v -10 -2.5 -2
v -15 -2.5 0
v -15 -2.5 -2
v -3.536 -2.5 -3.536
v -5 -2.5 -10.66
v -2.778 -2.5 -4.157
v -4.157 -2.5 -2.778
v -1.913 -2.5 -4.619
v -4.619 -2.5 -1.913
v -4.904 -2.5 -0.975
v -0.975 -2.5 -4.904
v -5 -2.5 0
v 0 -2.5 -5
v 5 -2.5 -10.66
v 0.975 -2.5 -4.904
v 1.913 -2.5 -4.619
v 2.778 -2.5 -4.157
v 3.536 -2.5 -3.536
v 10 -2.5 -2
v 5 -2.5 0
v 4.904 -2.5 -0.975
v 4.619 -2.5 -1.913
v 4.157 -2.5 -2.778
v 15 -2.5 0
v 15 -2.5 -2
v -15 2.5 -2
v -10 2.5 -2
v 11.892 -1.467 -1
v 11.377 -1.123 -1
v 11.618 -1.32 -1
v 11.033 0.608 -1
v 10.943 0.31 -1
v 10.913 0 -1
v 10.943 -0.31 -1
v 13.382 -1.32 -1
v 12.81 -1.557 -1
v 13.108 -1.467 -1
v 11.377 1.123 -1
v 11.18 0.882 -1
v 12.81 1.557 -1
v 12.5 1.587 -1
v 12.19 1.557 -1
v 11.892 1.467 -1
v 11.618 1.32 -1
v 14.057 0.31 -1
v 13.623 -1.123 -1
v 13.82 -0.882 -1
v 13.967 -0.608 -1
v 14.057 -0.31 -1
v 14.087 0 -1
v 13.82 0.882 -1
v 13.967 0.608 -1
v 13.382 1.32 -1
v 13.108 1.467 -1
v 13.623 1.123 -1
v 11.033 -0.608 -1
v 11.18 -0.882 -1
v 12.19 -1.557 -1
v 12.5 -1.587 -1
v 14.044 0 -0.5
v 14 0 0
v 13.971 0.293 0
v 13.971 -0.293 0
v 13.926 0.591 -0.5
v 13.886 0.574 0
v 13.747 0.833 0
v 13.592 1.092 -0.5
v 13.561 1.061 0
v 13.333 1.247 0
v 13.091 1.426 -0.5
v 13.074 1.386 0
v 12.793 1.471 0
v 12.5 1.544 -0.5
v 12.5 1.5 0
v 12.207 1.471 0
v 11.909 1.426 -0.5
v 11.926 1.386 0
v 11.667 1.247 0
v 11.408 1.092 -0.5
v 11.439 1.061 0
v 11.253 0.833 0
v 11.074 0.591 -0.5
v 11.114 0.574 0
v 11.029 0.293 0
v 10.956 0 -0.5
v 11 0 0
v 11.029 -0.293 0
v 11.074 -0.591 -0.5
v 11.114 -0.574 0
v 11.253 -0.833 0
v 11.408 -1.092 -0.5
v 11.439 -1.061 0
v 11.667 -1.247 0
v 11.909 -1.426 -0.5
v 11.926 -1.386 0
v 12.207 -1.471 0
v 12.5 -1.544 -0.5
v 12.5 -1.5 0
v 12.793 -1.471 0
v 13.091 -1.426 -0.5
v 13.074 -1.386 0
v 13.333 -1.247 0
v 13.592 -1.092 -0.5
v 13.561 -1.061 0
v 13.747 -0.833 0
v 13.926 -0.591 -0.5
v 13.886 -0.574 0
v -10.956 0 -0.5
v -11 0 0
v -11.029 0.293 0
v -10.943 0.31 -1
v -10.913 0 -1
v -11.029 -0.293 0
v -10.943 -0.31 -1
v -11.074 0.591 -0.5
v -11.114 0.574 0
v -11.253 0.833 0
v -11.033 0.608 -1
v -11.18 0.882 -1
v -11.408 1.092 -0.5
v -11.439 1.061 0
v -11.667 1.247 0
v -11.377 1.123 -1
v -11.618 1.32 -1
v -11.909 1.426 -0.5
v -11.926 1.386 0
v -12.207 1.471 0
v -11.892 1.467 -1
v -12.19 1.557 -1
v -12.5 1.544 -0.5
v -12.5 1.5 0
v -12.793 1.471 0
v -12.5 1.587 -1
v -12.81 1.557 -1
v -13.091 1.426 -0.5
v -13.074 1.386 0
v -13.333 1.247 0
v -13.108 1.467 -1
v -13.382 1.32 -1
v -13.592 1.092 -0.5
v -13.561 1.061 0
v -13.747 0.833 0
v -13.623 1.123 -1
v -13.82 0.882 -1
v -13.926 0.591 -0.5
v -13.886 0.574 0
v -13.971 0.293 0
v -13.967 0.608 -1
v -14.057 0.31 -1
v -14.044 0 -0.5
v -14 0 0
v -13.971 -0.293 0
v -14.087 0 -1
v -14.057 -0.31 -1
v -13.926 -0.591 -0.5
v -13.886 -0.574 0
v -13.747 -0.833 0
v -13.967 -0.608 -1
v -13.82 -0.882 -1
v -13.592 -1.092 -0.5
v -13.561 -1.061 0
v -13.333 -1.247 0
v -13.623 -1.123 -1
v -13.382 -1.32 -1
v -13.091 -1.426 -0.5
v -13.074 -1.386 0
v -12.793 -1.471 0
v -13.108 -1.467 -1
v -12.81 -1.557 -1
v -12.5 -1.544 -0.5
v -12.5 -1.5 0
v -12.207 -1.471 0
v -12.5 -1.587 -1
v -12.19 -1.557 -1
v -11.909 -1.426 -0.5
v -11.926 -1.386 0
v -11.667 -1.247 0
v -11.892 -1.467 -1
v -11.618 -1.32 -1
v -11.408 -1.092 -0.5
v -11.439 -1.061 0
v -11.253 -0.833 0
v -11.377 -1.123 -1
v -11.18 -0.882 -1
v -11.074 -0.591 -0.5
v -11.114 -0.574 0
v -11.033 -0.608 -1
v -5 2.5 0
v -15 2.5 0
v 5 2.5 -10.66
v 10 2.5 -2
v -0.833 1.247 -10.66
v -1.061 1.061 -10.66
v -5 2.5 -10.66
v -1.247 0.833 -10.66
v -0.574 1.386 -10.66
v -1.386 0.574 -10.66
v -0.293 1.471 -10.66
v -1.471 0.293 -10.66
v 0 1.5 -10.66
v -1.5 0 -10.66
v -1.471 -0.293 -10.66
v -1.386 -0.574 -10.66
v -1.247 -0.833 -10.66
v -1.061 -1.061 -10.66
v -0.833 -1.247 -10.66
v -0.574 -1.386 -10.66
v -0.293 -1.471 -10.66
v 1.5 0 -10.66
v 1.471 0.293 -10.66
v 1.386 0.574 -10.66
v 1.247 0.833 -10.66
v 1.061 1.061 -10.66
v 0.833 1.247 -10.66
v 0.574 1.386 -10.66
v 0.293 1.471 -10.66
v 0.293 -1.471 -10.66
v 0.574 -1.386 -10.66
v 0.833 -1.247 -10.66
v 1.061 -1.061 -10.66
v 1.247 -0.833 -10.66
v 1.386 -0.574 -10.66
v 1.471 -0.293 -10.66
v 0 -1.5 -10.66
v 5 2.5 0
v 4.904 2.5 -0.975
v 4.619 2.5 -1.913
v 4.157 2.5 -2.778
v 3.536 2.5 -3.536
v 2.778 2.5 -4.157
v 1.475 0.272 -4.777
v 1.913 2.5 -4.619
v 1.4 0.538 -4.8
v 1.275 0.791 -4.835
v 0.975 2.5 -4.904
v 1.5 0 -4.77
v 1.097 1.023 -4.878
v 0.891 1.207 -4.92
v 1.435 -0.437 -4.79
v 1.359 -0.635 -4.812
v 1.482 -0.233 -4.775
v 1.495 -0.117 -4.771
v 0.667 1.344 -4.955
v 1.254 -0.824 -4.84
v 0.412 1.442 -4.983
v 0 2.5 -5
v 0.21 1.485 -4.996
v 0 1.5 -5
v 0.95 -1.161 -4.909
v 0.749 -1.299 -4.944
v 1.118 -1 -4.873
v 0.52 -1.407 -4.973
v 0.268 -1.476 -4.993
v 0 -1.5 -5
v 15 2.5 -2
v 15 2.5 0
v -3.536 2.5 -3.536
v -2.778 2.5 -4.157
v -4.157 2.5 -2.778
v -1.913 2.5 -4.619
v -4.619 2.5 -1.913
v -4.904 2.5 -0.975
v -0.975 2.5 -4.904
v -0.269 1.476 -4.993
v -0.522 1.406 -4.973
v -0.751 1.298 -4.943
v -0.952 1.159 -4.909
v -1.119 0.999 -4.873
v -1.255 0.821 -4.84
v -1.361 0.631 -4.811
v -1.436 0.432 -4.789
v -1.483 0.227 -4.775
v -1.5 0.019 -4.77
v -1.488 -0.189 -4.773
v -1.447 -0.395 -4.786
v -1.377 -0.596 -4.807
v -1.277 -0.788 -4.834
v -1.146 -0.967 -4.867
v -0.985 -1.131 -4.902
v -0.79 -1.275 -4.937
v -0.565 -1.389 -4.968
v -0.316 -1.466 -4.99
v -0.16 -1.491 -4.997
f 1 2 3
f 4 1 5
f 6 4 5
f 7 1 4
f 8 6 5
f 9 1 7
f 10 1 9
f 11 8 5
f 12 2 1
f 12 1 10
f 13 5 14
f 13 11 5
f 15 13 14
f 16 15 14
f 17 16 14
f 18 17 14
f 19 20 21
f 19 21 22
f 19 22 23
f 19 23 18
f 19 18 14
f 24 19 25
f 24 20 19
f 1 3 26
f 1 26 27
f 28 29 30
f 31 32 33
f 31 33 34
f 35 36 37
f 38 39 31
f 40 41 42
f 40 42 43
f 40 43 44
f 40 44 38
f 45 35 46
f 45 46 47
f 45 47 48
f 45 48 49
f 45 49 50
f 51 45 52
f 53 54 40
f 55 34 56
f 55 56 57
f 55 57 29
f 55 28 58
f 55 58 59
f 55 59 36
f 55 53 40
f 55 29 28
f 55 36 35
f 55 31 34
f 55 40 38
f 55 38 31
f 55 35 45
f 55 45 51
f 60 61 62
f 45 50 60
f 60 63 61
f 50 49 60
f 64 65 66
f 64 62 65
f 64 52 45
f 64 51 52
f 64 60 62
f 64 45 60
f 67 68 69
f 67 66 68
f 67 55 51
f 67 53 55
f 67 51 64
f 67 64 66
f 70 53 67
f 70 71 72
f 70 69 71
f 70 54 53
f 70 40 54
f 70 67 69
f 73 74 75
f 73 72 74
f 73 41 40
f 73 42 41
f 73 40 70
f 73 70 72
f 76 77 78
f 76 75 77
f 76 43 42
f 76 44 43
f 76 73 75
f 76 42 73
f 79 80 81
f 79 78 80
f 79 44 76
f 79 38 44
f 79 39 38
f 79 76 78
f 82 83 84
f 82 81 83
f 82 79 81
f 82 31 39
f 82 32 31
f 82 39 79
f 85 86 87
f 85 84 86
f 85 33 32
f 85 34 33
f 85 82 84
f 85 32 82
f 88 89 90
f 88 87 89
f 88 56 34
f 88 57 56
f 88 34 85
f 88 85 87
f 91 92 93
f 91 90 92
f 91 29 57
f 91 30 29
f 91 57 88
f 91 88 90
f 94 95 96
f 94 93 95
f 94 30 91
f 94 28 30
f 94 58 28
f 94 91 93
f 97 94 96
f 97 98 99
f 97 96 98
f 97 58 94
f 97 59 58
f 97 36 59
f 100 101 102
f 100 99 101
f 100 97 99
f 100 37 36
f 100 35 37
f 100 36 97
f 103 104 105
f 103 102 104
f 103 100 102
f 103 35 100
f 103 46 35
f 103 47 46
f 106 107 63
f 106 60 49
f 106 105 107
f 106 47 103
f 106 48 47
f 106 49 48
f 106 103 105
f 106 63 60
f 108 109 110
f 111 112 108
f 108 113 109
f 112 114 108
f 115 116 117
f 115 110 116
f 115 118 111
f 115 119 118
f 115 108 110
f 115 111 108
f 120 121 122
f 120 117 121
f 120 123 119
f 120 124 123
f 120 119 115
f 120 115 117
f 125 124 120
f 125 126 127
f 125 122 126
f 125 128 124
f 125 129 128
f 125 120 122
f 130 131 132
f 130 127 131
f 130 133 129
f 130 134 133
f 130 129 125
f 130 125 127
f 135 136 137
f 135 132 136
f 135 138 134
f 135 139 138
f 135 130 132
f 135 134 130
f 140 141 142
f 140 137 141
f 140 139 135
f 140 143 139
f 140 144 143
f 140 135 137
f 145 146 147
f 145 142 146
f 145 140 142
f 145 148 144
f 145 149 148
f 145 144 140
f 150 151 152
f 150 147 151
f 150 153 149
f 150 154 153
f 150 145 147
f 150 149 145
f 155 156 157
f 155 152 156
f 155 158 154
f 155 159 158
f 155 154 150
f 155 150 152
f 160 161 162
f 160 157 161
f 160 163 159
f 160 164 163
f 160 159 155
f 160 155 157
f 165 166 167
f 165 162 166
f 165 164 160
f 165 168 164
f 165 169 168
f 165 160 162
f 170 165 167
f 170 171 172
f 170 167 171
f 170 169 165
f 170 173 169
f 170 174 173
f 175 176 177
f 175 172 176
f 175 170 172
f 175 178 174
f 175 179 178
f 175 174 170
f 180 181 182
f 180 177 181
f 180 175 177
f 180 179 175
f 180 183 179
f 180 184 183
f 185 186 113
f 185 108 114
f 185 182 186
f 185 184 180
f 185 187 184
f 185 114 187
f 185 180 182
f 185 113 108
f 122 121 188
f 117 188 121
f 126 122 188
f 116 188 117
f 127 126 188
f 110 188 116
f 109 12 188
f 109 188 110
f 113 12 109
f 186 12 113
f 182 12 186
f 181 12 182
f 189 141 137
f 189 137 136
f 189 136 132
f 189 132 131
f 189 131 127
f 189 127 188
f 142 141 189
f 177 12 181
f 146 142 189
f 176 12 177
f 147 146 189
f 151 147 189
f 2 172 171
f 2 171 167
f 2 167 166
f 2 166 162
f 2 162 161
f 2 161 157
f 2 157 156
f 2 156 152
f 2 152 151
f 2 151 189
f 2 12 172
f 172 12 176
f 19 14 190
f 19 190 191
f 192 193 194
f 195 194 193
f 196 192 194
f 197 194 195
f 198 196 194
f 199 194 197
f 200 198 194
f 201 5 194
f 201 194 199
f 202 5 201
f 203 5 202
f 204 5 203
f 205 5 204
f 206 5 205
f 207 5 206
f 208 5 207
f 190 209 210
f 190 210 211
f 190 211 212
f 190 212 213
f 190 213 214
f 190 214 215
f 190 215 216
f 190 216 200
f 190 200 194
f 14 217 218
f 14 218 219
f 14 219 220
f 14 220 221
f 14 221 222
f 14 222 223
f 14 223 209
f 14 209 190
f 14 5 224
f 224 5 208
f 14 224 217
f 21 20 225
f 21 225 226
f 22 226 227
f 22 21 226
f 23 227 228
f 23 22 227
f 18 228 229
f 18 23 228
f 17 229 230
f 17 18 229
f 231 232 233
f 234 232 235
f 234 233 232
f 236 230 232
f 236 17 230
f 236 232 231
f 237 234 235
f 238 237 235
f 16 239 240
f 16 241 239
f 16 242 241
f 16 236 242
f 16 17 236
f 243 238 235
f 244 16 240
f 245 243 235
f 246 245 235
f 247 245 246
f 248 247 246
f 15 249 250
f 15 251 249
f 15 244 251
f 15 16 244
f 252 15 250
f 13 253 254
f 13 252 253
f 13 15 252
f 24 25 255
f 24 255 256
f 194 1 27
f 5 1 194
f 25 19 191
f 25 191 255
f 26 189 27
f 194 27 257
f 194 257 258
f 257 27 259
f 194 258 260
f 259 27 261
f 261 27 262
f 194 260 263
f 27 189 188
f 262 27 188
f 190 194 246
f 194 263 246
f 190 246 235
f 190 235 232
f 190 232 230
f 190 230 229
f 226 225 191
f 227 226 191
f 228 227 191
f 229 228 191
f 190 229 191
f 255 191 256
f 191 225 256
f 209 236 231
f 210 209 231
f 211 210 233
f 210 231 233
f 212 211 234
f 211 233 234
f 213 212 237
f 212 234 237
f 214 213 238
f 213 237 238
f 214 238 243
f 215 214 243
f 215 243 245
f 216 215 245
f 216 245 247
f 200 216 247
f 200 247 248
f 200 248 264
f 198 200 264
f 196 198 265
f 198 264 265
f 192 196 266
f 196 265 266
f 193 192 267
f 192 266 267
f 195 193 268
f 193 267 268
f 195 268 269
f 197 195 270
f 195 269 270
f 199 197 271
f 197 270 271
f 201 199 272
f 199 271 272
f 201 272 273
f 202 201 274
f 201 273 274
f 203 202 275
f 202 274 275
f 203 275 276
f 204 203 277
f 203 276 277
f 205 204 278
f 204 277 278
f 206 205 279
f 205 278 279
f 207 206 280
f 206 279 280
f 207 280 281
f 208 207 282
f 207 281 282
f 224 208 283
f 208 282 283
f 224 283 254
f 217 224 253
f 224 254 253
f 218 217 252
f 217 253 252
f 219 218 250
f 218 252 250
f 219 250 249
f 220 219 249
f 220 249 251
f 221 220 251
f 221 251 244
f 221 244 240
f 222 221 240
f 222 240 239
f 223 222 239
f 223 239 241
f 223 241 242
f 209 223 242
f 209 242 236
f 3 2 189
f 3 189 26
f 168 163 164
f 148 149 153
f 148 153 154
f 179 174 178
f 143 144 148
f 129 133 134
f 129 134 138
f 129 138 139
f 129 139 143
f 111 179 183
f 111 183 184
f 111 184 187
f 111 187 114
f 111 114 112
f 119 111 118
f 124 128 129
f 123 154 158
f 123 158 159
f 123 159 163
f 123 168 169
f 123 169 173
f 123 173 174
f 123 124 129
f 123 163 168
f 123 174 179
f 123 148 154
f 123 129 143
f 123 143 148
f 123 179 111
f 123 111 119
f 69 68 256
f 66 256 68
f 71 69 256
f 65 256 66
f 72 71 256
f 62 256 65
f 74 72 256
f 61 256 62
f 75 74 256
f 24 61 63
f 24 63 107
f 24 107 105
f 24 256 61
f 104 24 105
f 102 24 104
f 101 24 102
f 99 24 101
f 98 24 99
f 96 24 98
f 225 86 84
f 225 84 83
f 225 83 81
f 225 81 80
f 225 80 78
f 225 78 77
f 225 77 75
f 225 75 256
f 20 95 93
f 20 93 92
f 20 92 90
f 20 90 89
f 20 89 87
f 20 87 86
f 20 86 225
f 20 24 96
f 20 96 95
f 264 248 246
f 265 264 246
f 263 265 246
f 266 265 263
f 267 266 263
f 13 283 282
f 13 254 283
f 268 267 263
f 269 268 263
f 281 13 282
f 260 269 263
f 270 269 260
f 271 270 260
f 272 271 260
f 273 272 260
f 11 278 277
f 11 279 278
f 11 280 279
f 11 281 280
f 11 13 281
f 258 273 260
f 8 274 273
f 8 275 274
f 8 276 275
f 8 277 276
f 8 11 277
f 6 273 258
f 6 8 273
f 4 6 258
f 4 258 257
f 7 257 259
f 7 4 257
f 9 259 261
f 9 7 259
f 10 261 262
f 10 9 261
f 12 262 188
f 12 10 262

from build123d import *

# Parameters (mm, degrees)
F1_DEPTH = 2.5
F3_R     = 1.5
F4_DEPTH = 1
F4_TAPER = -5
F5_DEPTH = 25


with BuildPart() as f1:
    # F0 (on Front) → F1 (new body, symmetric)
    with BuildSketch(Plane.XZ):
        with BuildLine():
            ThreePointArc((0, -5), (-3.5355339059, -3.5355339059), (-5, 0))
            Line((-5, 0), (-15, 0))
            Line((-15, 0), (-15, -2))
            Line((-15, -2), (-10, -2))
            Line((-10, -2), (-5, -10.6602540378))
            Line((-5, -10.6602540378), (0, -10.6602540378))
            Line((0, -10.6602540378), (5, -10.6602540378))
            Line((5, -10.6602540378), (10, -2))
            Line((10, -2), (15, -2))
            Line((15, -2), (15, 0))
            Line((15, 0), (5, 0))
            ThreePointArc((5, 0), (3.5355339059, -3.5355339059), (0, -5))
        make_face()
    extrude(amount=F1_DEPTH, both=True)

    # F3 (on offset) → F4 (cut)
    with BuildSketch(Plane.XY):
        with Locations((-12.5, 0)):
            Circle(F3_R)
        with Locations((12.5, 0)):
            Circle(F3_R)
    extrude(amount=-F4_DEPTH, taper=F4_TAPER, mode=Mode.SUBTRACT)

    # F3 (on offset) → F5 (cut)
    with BuildSketch(Plane.XY):
        Circle(F3_R)
    extrude(amount=-F5_DEPTH, mode=Mode.SUBTRACT)


solid = f1.part
